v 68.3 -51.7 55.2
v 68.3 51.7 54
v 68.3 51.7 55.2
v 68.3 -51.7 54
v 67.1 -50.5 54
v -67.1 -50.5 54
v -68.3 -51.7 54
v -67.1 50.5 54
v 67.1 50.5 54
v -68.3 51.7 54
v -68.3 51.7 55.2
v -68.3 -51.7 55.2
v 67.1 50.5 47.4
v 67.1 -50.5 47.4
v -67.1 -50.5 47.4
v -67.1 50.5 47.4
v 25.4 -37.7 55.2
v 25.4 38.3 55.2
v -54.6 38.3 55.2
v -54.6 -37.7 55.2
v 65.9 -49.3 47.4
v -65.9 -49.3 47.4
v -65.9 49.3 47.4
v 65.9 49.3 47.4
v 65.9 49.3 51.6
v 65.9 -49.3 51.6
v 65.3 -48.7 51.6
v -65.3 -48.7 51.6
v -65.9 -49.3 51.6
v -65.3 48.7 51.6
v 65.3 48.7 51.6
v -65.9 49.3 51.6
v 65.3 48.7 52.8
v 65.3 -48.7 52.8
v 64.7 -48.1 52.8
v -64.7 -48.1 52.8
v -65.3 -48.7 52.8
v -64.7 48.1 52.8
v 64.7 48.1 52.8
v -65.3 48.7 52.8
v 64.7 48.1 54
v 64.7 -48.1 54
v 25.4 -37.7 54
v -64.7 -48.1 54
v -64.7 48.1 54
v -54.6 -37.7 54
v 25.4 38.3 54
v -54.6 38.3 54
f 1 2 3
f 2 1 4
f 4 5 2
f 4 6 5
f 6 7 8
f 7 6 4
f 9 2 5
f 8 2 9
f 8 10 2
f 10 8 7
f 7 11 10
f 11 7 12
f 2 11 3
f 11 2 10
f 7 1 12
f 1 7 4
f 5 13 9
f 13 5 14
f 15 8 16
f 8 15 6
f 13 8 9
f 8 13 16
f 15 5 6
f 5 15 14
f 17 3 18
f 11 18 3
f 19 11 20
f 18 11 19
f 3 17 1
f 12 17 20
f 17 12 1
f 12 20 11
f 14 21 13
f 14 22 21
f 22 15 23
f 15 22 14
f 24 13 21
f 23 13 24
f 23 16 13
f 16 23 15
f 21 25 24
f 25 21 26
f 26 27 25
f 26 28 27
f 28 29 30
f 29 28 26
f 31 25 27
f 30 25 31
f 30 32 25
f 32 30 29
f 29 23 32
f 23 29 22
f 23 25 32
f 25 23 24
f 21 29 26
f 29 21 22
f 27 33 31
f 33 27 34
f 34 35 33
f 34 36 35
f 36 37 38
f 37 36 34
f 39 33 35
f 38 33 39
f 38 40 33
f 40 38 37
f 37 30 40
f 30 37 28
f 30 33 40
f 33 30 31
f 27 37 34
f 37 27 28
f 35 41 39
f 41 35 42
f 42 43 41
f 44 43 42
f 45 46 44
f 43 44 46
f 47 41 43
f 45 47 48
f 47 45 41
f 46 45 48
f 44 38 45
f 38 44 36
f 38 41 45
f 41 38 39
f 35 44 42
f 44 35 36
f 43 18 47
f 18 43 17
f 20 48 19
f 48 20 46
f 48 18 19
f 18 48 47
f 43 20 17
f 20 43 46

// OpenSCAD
// Higher definition curves
$fs = 0.1;

// on all sides
box_thickness = 1.2;

// Allow some slack to insert the board
slack = 2;

// The motherboard actual dimensions
x_board=130.2;
y_board=97.0;

// Solder and pins extruding under the power supply board
z_under_board=3;

z_fiberglass = 1.5;
z_switch = 13.2;
z_usb_adapter = 25.6;

// Board's top surface distance from box bottom
bottom_dz=16.3;

box_outer_dim_x = x_board + 2*slack + 2*box_thickness;
box_outer_dim_y = y_board + 2*slack + 2*box_thickness;
// accommodate vertical extent of USB2.0 adapter board
// and power supply board:
//   https://www.thanassis.space/atomicpi.html
//   https://www.thanassis.space/atomicpi-usb2.html
// Also, give slack on Z-axis.
box_outer_dim_z = z_under_board + z_fiberglass + z_switch + 
    z_fiberglass + z_usb_adapter + 4*slack + 2*box_thickness;

// Inner box dimensions - just remove the 2*box_thickness
box_inner_dim_x = x_board + 2*slack;
box_inner_dim_y = y_board + 2*slack;
box_inner_dim_z = z_under_board + z_fiberglass + z_switch + 
    z_fiberglass + z_usb_adapter + 4*slack;

// Amount of shift to do to avoid z_fights
z_fight = 2.25;

// Heatsink
heatsink_width = 70;
heatsink_depth = 66;
heatsink_dx_from_left_inner = 17.5;
heatsink_dy_from_front_inner = 17.8;
 
// Give it 0.5cm on either side, to breathe...
heatsink_slack = 10;
heatsink_hole_width = heatsink_width + heatsink_slack;
heatsink_hole_depth = heatsink_depth + heatsink_slack;

difference() {

    // Start from a cube that will be 5.5 + 1 box_thickness high
    translate([
            -box_outer_dim_x/2,
            -box_outer_dim_y/2,
            box_outer_dim_z - box_thickness - 5.5*box_thickness])
        cube([
            box_outer_dim_x,
            box_outer_dim_y,
            6.5*box_thickness]);

    // ...and subtract the original box.
    the_box();

    // This gives us a proper cover - but wastes filament.

    // Verify dents
    // translate([0, box_outer_dim_y/2-5, box_outer_dim_z-15])
    //     cube([20,20,90]);

    // This gives us a proper cover - but wastes filament.
    // To stop wasting filament, cut a cube of box_inner_dimensions,
    // with 1 box_thickness subtracted on either side
    inner_negative_cube_x = box_inner_dim_x - 2*box_thickness;
    inner_negative_cube_y = box_inner_dim_y - 2*box_thickness;
    translate([
            -inner_negative_cube_x/2,
            -inner_negative_cube_y/2,
            0])
        cube([
            inner_negative_cube_x,
            inner_negative_cube_y,
            // Make the inside part of the cover thicker
            // This will make the closing of the box
            // a more "snag" fit.
            // It will also make the cover stronger.
            box_outer_dim_z - 3*box_thickness]);

    inner_negative_cube2_x = box_inner_dim_x - 3*box_thickness;
    inner_negative_cube2_y = box_inner_dim_y - 3*box_thickness;
    translate([
            -inner_negative_cube2_x/2,
            -inner_negative_cube2_y/2,
            0])
        cube([
            inner_negative_cube2_x,
            inner_negative_cube2_y,
            // Make the inside part of the cover thicker
            // This will make the closing of the box
            // a more "snag" fit.
            // It will also make the cover stronger.
            box_outer_dim_z - 2*box_thickness]);

    inner_negative_cube3_x = box_inner_dim_x - 4*box_thickness;
    inner_negative_cube3_y = box_inner_dim_y - 4*box_thickness;
    translate([
            -inner_negative_cube3_x/2,
            -inner_negative_cube3_y/2,
            0])
        cube([
            inner_negative_cube3_x,
            inner_negative_cube3_y,
            // Make the inside part of the cover thicker
            // This will make the closing of the box
            // a more "snag" fit.
            // It will also make the cover stronger.
            box_outer_dim_z - 1*box_thickness]);

    // Now let the heatsink "breathe".
    translate([
            -box_inner_dim_x/2 + heatsink_dx_from_left_inner
                -heatsink_slack/2,
            -box_inner_dim_y/2 + heatsink_dy_from_front_inner
                -heatsink_slack/2,
            0])
        cube([
            heatsink_hole_width,
            heatsink_hole_depth,
            // Make the inside part of the cover thicker
            // This will make the closing of the box
            // a more "snag" fit.
            // It will also make the cover stronger.
            box_outer_dim_z + 20*box_thickness]);
}

module the_box() {
    difference() {
        translate([
                -box_outer_dim_x/2,
                -box_outer_dim_y/2,
                -box_thickness])
            cube([
                box_outer_dim_x,
                box_outer_dim_y,
                box_outer_dim_z]);
    
        translate([
                -box_inner_dim_x/2,
                -box_inner_dim_y/2,
                0])
            cube([
                box_inner_dim_x,
                box_inner_dim_y,
                // Z needs the outer dim during the difference,
                // to avoid Z-fighting
                box_outer_dim_z + z_fight]);
    }
}

echo("### DBG ###", box_outer_dim_z - box_thickness - 
        (box_outer_dim_z + z_fight));
